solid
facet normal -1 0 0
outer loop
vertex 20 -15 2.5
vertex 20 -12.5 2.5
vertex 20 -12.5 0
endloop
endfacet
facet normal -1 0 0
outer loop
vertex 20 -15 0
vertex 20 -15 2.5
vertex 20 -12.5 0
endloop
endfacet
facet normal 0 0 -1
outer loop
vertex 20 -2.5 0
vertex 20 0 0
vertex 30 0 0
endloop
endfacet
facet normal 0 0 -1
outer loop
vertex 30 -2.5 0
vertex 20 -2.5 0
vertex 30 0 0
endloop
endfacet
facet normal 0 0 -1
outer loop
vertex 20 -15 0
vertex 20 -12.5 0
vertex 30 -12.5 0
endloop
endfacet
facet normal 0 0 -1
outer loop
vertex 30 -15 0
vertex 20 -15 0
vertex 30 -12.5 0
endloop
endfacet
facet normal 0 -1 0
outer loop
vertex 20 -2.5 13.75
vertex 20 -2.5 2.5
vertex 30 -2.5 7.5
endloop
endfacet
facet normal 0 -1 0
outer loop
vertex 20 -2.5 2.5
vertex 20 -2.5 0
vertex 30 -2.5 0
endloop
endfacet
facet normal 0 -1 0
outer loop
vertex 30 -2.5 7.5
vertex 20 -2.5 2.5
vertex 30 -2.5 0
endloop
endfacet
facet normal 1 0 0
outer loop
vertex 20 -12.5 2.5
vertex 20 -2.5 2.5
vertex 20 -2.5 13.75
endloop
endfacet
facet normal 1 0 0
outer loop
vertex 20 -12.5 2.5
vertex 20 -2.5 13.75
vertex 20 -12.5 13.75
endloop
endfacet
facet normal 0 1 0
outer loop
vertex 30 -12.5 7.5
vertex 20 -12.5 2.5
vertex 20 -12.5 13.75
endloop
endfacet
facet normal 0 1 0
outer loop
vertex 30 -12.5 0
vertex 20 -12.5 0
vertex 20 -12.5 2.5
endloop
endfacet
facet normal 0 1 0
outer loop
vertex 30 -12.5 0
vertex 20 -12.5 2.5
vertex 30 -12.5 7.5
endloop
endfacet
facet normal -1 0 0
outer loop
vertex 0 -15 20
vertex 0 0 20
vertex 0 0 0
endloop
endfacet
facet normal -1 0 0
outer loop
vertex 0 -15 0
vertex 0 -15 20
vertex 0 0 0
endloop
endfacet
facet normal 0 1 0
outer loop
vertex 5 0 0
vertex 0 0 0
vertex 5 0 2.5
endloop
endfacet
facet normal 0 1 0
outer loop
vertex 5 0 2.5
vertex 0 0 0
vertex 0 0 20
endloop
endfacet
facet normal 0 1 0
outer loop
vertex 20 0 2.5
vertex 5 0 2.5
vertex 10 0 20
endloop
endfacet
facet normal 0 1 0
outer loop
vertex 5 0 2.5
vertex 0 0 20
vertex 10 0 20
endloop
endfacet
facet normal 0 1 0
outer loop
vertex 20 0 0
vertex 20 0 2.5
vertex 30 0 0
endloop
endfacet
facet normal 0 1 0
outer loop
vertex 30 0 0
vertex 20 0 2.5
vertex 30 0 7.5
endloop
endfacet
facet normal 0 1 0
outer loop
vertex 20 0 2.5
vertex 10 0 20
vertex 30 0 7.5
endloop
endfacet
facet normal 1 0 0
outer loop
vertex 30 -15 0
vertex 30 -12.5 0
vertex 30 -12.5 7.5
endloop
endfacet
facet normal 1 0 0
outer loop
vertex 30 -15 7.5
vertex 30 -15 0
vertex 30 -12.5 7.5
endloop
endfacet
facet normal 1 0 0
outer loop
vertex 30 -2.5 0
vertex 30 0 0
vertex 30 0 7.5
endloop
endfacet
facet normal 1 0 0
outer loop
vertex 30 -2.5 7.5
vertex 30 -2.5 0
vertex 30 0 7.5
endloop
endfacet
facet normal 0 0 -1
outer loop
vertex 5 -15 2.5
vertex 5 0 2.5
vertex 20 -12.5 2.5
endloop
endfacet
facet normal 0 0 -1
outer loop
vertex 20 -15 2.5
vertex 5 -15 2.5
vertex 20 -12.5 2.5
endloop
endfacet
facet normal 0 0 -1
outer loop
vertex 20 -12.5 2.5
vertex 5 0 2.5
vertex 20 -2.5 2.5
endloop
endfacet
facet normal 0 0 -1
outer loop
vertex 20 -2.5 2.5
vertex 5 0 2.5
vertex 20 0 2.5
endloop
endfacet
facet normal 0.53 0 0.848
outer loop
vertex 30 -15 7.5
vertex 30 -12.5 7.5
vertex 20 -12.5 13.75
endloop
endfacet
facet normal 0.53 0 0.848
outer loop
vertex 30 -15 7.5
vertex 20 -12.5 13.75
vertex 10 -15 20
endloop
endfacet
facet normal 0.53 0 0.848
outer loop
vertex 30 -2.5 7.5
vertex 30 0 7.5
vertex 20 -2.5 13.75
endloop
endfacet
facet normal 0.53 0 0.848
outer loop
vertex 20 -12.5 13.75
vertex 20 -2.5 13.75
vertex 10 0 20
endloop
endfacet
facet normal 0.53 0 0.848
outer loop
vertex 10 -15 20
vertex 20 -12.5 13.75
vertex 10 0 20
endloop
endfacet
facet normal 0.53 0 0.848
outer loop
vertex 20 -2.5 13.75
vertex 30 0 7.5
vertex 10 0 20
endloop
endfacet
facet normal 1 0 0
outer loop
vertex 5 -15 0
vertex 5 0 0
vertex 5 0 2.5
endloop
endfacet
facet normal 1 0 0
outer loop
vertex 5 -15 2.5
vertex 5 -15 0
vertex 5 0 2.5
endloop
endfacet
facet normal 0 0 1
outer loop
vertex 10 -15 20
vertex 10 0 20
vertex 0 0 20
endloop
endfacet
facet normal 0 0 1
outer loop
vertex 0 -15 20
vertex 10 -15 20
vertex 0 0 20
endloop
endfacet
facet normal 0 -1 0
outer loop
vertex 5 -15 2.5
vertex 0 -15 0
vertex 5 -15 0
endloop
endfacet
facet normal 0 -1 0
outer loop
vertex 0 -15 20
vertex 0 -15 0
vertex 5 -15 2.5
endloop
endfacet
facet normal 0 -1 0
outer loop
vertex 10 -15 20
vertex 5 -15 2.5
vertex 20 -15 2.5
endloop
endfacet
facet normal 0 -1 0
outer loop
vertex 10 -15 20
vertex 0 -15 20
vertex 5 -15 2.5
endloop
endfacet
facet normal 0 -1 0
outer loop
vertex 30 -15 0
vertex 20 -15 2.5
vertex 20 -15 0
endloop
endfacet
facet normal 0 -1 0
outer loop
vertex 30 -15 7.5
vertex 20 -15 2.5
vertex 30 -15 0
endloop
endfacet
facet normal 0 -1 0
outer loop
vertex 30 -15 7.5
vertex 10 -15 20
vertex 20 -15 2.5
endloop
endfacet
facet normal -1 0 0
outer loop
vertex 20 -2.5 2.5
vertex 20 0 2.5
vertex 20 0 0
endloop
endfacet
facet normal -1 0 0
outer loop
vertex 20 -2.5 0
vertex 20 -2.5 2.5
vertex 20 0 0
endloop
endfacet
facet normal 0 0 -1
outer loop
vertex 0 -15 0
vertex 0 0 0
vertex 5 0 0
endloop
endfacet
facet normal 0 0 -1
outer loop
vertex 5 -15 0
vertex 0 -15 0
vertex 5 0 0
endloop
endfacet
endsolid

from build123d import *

# Parameters (mm, degrees)
F1_DEPTH = 15
F2_W     = 10
F2_H     = 10
F3_DEPTH = 25


with BuildPart() as f1:
    # F0 (on Front) → F1 (new body)
    with BuildSketch(Plane.XZ):
        Polygon((0, 20), (0, 0), (5, 0), (5, 2.5), (20, 2.5), (20, 0), (30, 0), (30, 7.5), (10, 20), align=None)
    extrude(amount=F1_DEPTH)

    # F2 (on face) → F3 (cut)
    with BuildSketch(Plane(origin=(0, 0, 0), x_dir=(1, 0, 0), z_dir=(0, 0, -1))):
        with Locations((25, 7.5)):
            Rectangle(F2_W, F2_H)
    extrude(amount=-F3_DEPTH, mode=Mode.SUBTRACT)


solid = f1.part
